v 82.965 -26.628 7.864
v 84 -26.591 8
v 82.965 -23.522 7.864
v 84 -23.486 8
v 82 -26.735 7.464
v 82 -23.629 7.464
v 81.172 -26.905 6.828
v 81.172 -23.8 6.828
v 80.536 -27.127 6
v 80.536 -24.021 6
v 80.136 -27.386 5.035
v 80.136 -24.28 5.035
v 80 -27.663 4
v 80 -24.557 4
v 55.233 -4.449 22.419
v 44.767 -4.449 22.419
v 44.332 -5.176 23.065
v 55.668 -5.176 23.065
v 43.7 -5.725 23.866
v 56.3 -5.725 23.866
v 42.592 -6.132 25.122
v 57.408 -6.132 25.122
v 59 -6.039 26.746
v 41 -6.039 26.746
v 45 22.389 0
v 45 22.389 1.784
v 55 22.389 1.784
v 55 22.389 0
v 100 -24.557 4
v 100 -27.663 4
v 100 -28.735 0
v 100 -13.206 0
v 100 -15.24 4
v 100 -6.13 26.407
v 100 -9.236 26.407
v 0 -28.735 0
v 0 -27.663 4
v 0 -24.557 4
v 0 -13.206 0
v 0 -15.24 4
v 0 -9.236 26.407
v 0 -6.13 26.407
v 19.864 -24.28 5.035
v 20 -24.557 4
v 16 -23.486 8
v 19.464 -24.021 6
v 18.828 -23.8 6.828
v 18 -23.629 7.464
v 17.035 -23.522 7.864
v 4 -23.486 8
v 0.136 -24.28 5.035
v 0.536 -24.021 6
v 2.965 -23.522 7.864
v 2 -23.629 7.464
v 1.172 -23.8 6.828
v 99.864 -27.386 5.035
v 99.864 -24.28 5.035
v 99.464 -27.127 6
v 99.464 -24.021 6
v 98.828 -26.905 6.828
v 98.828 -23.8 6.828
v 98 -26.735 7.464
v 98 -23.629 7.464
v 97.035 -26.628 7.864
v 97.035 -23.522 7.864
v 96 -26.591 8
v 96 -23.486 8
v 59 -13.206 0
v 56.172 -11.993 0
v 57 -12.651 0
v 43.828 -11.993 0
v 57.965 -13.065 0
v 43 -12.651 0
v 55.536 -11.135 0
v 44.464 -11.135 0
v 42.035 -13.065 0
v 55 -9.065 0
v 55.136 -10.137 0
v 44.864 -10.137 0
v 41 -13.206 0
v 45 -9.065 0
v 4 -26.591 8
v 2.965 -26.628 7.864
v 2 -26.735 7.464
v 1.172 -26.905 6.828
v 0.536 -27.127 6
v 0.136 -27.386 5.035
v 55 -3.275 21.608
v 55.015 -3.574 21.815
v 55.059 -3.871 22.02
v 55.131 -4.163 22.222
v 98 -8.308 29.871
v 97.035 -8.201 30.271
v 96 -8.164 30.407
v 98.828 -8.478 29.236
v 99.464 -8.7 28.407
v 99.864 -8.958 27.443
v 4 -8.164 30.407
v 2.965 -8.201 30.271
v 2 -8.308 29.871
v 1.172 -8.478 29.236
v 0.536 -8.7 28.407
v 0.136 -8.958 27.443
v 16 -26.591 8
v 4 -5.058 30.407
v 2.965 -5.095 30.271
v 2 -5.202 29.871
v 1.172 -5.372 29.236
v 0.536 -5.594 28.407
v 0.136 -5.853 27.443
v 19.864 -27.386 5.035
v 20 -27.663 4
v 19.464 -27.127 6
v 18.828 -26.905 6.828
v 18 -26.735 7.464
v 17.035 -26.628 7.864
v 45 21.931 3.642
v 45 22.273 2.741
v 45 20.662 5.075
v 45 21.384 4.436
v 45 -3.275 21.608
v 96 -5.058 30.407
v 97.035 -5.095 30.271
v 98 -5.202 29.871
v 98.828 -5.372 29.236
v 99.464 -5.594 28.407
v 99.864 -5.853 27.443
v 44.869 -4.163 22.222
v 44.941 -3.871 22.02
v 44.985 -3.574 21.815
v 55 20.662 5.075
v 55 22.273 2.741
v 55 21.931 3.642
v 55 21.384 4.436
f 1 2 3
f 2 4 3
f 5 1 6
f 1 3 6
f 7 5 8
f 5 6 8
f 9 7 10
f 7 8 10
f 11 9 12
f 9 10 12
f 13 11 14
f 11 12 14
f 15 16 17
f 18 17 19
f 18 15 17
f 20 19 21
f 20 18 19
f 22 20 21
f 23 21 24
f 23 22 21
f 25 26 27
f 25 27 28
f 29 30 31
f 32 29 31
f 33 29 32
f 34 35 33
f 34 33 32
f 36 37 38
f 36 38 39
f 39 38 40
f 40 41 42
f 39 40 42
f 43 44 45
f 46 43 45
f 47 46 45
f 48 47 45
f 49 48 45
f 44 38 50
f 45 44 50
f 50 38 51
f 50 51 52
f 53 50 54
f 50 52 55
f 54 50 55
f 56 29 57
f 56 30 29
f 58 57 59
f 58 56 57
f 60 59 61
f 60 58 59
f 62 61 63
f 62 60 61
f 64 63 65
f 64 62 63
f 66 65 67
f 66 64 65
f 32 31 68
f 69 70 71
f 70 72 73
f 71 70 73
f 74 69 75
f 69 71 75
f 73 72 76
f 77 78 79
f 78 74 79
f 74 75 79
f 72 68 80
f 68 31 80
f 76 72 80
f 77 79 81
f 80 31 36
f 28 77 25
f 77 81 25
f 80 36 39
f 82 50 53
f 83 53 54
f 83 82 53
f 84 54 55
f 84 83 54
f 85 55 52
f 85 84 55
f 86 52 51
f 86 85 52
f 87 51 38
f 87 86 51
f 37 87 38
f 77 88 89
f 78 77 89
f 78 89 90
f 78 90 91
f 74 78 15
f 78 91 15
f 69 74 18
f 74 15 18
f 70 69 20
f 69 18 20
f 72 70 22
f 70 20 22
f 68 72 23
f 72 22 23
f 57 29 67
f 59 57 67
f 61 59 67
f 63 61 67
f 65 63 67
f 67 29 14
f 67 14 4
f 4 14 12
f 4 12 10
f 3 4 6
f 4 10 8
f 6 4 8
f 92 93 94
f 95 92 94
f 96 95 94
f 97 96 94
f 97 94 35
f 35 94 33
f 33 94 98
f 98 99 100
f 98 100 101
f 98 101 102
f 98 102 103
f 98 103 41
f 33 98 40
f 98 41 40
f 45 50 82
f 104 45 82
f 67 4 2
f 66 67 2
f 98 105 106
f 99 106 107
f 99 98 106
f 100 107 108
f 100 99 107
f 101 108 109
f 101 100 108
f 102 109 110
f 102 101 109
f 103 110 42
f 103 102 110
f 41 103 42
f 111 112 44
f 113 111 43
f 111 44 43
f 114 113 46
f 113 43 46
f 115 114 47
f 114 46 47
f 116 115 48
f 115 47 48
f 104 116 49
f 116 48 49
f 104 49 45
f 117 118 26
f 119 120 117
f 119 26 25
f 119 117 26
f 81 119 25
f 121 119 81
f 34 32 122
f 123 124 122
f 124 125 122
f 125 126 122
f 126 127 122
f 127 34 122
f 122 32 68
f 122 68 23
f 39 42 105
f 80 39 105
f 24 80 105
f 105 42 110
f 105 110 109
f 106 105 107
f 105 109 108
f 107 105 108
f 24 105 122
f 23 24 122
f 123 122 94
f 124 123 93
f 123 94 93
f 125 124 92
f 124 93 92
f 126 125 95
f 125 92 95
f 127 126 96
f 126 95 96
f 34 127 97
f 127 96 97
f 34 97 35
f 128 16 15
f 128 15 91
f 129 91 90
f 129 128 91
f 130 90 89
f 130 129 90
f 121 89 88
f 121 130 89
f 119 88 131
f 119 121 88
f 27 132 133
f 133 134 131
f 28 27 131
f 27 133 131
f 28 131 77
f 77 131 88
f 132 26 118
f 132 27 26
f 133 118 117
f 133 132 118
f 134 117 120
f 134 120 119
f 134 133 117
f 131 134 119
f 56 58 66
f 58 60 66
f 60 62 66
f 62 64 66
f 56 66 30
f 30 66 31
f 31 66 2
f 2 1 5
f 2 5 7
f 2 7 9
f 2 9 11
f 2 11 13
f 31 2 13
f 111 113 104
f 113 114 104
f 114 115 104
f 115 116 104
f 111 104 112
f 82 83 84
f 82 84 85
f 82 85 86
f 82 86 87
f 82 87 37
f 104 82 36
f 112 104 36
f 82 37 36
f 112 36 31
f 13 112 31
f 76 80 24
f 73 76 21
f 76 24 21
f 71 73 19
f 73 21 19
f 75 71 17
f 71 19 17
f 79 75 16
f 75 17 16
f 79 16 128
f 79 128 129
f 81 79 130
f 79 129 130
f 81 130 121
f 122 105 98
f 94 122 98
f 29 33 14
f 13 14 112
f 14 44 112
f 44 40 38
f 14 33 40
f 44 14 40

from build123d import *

# Parameters (mm, degrees)
F1_DEPTH = 100
F3_START = -45
F3_DEPTH = 10
F4_R     = 4
F5_W     = 60
F5_H     = 8.6717781019
F6_DEPTH = 4
F7_R     = 3.99999


# Not quite as in the source:
# - a fillet or chamfer is up to 0.001 mm smaller than in the source, because OpenCascade refuses the exact size


with BuildPart() as f1:
    # F0 (on Right) → F1 (new body)
    with BuildSketch(Plane.YZ):
        Polygon((-5.0582498297, 30.4073218231), (-8.1640783709, 30.4073218231), (-15.2398989277, 4), (-24.5573845514, 4), (-23.4855877816, 8), (-26.5914163229, 8), (-28.7350098623, 0), (-13.2058671562, 0), align=None)
    extrude(amount=F1_DEPTH)

    # F2 (on face) → F3 (join)
    with BuildSketch(Plane(origin=(0, 0, 0), x_dir=(0, -1, 0), z_dir=(-1, 0, 0)).offset(F3_START)):
        Polygon((13.2058671562, 0), (6.7691872092, 24.0220165943), (-22.3890729249, 3.8824980147), (-22.3890729249, 0), align=None)
    extrude(amount=-F3_DEPTH)

    # F4 (call 1 of 6: OpenCascade refuses the feature's edges together)
    f4_edges = [f1.edges().sort_by_distance(p)[0] for p in [
        (0, -6.611164, 30.407322),
    ]]
    fillet(f4_edges, radius=F4_R)

    # F4#2 (call 2 of 6)
    f4_2_edges = [f1.edges().sort_by_distance(p)[0] for p in [
        (100, -6.611164, 30.407322),
    ]]
    fillet(f4_2_edges, radius=F4_R)

    # F4#3 (call 3 of 6)
    f4_3_edges = [f1.edges().sort_by_distance(p)[0] for p in [
        (100, -25.038502, 8),
    ]]
    fillet(f4_3_edges, radius=F4_R)

    # F4#4 (call 4 of 6)
    f4_4_edges = [f1.edges().sort_by_distance(p)[0] for p in [
        (0, -25.038502, 8),
    ]]
    fillet(f4_4_edges, radius=F4_R)

    # F4#5 (call 5 of 6)
    f4_5_edges = [f1.edges().sort_by_distance(p)[0] for p in [
        (50, 22.389073, 3.882498),
    ]]
    fillet(f4_5_edges, radius=F4_R)

    # F4#6 (call 6 of 6)
    f4_6_edges = [f1.edges().sort_by_distance(p)[0] for p in [
        (50, -6.769187, 24.022017),
        (45, -9.987527, 12.011008),
        (55, -9.987527, 12.011008),
    ]]
    fillet(f4_6_edges, radius=F4_R)

    # F5 (on face) → F6 (cut)
    with BuildSketch(Plane.XY.offset(8)):
        with Locations((50, -27.8214768326)):
            Rectangle(F5_W, F5_H)
    extrude(amount=-F6_DEPTH, mode=Mode.SUBTRACT)

    # F7 (radius 4 in the source; OpenCascade refuses exactly that, so slightly less here)
    f7_edges = [f1.edges().sort_by_distance(p)[0] for p in [
        (20, -25.038502, 8),
        (80, -25.038502, 8),
    ]]
    fillet(f7_edges, radius=F7_R)


solid = f1.part
